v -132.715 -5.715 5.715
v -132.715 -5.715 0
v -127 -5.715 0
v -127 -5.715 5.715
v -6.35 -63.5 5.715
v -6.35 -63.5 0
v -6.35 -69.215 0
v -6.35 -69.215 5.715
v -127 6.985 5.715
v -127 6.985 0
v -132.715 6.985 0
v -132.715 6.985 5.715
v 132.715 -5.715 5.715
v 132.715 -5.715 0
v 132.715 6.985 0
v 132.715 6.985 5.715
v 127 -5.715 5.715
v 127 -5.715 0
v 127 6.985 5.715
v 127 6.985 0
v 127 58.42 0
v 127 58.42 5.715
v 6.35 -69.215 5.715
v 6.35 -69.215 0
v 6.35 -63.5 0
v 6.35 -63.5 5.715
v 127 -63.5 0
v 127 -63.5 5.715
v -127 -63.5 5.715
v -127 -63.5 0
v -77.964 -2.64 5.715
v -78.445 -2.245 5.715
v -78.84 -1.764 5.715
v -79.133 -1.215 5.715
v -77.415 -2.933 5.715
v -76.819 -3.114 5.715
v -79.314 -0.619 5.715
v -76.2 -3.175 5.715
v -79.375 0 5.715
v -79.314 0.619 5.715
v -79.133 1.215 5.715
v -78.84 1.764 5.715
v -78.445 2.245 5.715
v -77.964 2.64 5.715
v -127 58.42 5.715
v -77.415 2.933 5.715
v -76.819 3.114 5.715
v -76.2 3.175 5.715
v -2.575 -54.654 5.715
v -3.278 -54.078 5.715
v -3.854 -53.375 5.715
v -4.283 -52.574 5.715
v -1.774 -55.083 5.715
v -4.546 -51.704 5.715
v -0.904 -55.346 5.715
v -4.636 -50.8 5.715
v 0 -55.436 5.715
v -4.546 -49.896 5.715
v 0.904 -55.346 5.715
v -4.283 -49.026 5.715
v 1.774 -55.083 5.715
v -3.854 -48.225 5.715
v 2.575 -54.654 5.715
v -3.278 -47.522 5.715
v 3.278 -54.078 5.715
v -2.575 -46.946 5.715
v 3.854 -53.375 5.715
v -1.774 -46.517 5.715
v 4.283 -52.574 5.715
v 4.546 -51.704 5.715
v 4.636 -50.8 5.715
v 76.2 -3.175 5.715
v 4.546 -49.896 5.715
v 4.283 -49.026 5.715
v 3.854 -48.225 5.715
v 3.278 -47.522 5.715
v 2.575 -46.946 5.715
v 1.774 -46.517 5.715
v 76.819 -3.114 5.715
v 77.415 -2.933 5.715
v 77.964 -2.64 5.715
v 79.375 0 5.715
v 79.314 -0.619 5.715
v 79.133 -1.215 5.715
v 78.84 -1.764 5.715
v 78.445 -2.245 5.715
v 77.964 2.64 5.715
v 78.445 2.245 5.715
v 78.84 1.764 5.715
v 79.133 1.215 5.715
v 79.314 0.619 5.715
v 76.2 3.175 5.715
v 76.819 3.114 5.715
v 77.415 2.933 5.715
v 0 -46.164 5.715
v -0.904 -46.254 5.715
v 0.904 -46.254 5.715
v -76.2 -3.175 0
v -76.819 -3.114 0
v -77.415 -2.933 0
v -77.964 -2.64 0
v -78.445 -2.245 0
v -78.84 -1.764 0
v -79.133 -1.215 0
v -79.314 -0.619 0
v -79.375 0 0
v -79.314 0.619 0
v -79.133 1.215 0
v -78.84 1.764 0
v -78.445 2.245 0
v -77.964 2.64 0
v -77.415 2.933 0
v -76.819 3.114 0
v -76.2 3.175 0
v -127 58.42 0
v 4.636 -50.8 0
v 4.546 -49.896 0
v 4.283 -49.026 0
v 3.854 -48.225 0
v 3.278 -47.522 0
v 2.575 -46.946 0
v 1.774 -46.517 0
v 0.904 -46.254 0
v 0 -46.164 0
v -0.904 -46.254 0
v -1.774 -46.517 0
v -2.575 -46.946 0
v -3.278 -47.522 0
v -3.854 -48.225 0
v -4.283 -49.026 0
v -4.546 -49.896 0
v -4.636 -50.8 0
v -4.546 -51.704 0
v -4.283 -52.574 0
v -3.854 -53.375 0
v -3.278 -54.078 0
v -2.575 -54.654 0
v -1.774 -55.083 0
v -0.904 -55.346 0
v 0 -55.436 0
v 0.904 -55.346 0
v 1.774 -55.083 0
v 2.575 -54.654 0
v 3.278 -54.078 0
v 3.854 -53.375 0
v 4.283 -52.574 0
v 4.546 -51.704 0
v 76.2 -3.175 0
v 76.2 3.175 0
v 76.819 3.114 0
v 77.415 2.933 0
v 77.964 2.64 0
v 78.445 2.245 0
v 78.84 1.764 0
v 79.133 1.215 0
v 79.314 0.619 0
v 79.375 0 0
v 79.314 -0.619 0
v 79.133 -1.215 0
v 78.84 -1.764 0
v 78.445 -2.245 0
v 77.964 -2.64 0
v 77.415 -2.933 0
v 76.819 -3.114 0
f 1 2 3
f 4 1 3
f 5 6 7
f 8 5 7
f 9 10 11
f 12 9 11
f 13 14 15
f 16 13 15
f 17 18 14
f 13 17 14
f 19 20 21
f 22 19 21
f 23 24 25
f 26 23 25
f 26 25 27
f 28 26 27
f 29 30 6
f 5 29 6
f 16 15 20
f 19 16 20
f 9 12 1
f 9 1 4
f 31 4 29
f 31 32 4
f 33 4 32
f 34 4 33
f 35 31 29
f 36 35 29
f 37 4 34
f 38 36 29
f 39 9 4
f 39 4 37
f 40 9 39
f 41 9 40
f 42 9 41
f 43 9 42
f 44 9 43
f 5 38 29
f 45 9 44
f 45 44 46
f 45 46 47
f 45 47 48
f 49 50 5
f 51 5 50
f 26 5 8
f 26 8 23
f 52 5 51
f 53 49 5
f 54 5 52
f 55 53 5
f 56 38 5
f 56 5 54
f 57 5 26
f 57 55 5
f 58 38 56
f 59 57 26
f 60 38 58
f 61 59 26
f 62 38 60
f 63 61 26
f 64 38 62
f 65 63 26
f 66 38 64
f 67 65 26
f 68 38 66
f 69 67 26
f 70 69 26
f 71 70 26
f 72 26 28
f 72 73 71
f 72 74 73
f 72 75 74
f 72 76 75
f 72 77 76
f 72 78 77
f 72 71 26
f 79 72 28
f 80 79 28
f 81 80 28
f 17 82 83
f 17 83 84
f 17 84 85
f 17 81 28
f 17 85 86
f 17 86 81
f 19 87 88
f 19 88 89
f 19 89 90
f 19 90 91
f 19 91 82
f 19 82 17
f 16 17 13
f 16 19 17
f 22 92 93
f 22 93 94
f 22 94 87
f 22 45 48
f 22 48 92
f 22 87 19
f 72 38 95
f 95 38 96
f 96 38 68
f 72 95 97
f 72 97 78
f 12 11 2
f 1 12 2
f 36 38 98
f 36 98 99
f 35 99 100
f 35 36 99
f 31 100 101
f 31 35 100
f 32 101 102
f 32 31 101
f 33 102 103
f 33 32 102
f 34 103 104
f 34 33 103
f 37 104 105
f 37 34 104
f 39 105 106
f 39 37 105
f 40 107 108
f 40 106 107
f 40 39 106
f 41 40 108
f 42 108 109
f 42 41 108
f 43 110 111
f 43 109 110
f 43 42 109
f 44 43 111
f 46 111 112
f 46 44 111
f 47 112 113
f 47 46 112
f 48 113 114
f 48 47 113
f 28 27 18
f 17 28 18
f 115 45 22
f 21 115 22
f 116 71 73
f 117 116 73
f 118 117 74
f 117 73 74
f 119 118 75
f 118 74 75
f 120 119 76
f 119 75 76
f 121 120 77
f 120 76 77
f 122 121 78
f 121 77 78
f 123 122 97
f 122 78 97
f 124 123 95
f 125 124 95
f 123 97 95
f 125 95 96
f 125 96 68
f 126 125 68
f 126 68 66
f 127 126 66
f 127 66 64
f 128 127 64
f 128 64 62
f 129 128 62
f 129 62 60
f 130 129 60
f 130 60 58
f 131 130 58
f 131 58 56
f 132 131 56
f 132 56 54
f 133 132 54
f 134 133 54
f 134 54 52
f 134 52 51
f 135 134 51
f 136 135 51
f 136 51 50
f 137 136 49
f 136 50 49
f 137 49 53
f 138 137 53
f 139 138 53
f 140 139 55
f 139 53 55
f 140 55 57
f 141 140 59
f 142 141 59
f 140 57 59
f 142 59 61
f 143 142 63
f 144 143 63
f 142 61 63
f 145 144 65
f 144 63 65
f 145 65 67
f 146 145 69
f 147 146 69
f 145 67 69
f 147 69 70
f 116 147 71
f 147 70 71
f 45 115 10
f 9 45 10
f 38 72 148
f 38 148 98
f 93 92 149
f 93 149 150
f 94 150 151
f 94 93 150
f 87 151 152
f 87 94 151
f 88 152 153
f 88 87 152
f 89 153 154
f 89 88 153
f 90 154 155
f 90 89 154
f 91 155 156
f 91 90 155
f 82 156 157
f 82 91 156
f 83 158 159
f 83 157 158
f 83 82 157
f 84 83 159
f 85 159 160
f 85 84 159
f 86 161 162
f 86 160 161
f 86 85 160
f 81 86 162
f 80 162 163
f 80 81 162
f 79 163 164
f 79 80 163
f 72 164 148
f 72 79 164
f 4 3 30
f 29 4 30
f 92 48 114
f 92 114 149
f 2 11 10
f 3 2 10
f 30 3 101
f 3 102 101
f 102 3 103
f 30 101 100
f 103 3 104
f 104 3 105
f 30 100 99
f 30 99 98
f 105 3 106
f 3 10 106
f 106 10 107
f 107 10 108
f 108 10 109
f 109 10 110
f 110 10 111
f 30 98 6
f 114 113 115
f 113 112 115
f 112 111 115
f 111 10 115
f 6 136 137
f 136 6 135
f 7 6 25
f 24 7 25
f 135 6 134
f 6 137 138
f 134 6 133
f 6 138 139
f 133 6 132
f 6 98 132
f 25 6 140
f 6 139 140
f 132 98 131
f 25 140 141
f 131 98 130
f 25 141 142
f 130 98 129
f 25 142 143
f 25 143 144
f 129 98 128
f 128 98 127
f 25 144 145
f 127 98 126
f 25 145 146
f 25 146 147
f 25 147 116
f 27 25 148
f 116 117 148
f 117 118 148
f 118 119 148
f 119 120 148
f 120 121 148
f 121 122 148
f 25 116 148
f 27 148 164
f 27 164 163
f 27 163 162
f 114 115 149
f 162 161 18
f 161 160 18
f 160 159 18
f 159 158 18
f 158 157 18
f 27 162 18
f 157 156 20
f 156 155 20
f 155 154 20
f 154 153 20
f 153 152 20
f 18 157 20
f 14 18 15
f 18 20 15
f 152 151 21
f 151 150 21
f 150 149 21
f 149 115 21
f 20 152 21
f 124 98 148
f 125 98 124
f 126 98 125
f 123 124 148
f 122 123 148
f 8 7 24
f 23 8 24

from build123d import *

# Parameters (mm, degrees)
BOSS_EXTRUDE1_DEPTH     = 5.715
CUT_EXTRUDE1_DEPTH      = 6.715
SKETCH4_R               = 4.6355
CUT_EXTRUDE2_DEPTH      = 1
CUT_EXTRUDE2_DEPTH_BACK = 6.715
SKETCH5_W               = 254
SKETCH5_H               = 5.08
CUT_EXTRUDE3_DEPTH      = 6.715


with BuildPart() as part:
    # Sketch1 → Boss-Extrude1 (new body)
    with BuildSketch(Plane.XY):
        Polygon((6.35, -63.5), (127, -63.5), (127, -5.715), (132.715, -5.715), (132.715, 6.985), (127, 6.985), (127, 63.5), (-127, 63.5), (-127, 6.985), (-132.715, 6.985), (-132.715, -5.715), (-127, -5.715), (-127, -63.5), (-6.35, -63.5), (-6.35, -69.215), (6.35, -69.215), align=None)
    extrude(amount=BOSS_EXTRUDE1_DEPTH)

    # Sketch2 → Cut-Extrude1 (cut, through all)
    with BuildSketch(Plane.XY.offset(5.715)):
        with BuildLine():
            Line((76.2, -3.175), (-76.2, -3.175))
            ThreePointArc((-76.2, -3.175), (-79.375, 0), (-76.2, 3.175))
            Line((-76.2, 3.175), (76.2, 3.175))
            ThreePointArc((76.2, 3.175), (79.375, 0), (76.2, -3.175))
        make_face()
    extrude(amount=-CUT_EXTRUDE1_DEPTH, mode=Mode.SUBTRACT)

    # Sketch4 → Cut-Extrude2 (cut, two sides)
    with BuildSketch(Plane.XY.offset(5.715)) as cut_extrude2_sk:
        with Locations((0, -50.8)):
            Circle(SKETCH4_R)
    extrude(amount=CUT_EXTRUDE2_DEPTH, mode=Mode.SUBTRACT)
    extrude(cut_extrude2_sk.sketch, amount=-CUT_EXTRUDE2_DEPTH_BACK, mode=Mode.SUBTRACT)

    # Sketch5 → Cut-Extrude3 (cut, through all)
    with BuildSketch(Plane.XY.offset(5.715)):
        with Locations((0, 60.96)):
            Rectangle(SKETCH5_W, SKETCH5_H)
    extrude(amount=-CUT_EXTRUDE3_DEPTH, mode=Mode.SUBTRACT)


solid = part.part
